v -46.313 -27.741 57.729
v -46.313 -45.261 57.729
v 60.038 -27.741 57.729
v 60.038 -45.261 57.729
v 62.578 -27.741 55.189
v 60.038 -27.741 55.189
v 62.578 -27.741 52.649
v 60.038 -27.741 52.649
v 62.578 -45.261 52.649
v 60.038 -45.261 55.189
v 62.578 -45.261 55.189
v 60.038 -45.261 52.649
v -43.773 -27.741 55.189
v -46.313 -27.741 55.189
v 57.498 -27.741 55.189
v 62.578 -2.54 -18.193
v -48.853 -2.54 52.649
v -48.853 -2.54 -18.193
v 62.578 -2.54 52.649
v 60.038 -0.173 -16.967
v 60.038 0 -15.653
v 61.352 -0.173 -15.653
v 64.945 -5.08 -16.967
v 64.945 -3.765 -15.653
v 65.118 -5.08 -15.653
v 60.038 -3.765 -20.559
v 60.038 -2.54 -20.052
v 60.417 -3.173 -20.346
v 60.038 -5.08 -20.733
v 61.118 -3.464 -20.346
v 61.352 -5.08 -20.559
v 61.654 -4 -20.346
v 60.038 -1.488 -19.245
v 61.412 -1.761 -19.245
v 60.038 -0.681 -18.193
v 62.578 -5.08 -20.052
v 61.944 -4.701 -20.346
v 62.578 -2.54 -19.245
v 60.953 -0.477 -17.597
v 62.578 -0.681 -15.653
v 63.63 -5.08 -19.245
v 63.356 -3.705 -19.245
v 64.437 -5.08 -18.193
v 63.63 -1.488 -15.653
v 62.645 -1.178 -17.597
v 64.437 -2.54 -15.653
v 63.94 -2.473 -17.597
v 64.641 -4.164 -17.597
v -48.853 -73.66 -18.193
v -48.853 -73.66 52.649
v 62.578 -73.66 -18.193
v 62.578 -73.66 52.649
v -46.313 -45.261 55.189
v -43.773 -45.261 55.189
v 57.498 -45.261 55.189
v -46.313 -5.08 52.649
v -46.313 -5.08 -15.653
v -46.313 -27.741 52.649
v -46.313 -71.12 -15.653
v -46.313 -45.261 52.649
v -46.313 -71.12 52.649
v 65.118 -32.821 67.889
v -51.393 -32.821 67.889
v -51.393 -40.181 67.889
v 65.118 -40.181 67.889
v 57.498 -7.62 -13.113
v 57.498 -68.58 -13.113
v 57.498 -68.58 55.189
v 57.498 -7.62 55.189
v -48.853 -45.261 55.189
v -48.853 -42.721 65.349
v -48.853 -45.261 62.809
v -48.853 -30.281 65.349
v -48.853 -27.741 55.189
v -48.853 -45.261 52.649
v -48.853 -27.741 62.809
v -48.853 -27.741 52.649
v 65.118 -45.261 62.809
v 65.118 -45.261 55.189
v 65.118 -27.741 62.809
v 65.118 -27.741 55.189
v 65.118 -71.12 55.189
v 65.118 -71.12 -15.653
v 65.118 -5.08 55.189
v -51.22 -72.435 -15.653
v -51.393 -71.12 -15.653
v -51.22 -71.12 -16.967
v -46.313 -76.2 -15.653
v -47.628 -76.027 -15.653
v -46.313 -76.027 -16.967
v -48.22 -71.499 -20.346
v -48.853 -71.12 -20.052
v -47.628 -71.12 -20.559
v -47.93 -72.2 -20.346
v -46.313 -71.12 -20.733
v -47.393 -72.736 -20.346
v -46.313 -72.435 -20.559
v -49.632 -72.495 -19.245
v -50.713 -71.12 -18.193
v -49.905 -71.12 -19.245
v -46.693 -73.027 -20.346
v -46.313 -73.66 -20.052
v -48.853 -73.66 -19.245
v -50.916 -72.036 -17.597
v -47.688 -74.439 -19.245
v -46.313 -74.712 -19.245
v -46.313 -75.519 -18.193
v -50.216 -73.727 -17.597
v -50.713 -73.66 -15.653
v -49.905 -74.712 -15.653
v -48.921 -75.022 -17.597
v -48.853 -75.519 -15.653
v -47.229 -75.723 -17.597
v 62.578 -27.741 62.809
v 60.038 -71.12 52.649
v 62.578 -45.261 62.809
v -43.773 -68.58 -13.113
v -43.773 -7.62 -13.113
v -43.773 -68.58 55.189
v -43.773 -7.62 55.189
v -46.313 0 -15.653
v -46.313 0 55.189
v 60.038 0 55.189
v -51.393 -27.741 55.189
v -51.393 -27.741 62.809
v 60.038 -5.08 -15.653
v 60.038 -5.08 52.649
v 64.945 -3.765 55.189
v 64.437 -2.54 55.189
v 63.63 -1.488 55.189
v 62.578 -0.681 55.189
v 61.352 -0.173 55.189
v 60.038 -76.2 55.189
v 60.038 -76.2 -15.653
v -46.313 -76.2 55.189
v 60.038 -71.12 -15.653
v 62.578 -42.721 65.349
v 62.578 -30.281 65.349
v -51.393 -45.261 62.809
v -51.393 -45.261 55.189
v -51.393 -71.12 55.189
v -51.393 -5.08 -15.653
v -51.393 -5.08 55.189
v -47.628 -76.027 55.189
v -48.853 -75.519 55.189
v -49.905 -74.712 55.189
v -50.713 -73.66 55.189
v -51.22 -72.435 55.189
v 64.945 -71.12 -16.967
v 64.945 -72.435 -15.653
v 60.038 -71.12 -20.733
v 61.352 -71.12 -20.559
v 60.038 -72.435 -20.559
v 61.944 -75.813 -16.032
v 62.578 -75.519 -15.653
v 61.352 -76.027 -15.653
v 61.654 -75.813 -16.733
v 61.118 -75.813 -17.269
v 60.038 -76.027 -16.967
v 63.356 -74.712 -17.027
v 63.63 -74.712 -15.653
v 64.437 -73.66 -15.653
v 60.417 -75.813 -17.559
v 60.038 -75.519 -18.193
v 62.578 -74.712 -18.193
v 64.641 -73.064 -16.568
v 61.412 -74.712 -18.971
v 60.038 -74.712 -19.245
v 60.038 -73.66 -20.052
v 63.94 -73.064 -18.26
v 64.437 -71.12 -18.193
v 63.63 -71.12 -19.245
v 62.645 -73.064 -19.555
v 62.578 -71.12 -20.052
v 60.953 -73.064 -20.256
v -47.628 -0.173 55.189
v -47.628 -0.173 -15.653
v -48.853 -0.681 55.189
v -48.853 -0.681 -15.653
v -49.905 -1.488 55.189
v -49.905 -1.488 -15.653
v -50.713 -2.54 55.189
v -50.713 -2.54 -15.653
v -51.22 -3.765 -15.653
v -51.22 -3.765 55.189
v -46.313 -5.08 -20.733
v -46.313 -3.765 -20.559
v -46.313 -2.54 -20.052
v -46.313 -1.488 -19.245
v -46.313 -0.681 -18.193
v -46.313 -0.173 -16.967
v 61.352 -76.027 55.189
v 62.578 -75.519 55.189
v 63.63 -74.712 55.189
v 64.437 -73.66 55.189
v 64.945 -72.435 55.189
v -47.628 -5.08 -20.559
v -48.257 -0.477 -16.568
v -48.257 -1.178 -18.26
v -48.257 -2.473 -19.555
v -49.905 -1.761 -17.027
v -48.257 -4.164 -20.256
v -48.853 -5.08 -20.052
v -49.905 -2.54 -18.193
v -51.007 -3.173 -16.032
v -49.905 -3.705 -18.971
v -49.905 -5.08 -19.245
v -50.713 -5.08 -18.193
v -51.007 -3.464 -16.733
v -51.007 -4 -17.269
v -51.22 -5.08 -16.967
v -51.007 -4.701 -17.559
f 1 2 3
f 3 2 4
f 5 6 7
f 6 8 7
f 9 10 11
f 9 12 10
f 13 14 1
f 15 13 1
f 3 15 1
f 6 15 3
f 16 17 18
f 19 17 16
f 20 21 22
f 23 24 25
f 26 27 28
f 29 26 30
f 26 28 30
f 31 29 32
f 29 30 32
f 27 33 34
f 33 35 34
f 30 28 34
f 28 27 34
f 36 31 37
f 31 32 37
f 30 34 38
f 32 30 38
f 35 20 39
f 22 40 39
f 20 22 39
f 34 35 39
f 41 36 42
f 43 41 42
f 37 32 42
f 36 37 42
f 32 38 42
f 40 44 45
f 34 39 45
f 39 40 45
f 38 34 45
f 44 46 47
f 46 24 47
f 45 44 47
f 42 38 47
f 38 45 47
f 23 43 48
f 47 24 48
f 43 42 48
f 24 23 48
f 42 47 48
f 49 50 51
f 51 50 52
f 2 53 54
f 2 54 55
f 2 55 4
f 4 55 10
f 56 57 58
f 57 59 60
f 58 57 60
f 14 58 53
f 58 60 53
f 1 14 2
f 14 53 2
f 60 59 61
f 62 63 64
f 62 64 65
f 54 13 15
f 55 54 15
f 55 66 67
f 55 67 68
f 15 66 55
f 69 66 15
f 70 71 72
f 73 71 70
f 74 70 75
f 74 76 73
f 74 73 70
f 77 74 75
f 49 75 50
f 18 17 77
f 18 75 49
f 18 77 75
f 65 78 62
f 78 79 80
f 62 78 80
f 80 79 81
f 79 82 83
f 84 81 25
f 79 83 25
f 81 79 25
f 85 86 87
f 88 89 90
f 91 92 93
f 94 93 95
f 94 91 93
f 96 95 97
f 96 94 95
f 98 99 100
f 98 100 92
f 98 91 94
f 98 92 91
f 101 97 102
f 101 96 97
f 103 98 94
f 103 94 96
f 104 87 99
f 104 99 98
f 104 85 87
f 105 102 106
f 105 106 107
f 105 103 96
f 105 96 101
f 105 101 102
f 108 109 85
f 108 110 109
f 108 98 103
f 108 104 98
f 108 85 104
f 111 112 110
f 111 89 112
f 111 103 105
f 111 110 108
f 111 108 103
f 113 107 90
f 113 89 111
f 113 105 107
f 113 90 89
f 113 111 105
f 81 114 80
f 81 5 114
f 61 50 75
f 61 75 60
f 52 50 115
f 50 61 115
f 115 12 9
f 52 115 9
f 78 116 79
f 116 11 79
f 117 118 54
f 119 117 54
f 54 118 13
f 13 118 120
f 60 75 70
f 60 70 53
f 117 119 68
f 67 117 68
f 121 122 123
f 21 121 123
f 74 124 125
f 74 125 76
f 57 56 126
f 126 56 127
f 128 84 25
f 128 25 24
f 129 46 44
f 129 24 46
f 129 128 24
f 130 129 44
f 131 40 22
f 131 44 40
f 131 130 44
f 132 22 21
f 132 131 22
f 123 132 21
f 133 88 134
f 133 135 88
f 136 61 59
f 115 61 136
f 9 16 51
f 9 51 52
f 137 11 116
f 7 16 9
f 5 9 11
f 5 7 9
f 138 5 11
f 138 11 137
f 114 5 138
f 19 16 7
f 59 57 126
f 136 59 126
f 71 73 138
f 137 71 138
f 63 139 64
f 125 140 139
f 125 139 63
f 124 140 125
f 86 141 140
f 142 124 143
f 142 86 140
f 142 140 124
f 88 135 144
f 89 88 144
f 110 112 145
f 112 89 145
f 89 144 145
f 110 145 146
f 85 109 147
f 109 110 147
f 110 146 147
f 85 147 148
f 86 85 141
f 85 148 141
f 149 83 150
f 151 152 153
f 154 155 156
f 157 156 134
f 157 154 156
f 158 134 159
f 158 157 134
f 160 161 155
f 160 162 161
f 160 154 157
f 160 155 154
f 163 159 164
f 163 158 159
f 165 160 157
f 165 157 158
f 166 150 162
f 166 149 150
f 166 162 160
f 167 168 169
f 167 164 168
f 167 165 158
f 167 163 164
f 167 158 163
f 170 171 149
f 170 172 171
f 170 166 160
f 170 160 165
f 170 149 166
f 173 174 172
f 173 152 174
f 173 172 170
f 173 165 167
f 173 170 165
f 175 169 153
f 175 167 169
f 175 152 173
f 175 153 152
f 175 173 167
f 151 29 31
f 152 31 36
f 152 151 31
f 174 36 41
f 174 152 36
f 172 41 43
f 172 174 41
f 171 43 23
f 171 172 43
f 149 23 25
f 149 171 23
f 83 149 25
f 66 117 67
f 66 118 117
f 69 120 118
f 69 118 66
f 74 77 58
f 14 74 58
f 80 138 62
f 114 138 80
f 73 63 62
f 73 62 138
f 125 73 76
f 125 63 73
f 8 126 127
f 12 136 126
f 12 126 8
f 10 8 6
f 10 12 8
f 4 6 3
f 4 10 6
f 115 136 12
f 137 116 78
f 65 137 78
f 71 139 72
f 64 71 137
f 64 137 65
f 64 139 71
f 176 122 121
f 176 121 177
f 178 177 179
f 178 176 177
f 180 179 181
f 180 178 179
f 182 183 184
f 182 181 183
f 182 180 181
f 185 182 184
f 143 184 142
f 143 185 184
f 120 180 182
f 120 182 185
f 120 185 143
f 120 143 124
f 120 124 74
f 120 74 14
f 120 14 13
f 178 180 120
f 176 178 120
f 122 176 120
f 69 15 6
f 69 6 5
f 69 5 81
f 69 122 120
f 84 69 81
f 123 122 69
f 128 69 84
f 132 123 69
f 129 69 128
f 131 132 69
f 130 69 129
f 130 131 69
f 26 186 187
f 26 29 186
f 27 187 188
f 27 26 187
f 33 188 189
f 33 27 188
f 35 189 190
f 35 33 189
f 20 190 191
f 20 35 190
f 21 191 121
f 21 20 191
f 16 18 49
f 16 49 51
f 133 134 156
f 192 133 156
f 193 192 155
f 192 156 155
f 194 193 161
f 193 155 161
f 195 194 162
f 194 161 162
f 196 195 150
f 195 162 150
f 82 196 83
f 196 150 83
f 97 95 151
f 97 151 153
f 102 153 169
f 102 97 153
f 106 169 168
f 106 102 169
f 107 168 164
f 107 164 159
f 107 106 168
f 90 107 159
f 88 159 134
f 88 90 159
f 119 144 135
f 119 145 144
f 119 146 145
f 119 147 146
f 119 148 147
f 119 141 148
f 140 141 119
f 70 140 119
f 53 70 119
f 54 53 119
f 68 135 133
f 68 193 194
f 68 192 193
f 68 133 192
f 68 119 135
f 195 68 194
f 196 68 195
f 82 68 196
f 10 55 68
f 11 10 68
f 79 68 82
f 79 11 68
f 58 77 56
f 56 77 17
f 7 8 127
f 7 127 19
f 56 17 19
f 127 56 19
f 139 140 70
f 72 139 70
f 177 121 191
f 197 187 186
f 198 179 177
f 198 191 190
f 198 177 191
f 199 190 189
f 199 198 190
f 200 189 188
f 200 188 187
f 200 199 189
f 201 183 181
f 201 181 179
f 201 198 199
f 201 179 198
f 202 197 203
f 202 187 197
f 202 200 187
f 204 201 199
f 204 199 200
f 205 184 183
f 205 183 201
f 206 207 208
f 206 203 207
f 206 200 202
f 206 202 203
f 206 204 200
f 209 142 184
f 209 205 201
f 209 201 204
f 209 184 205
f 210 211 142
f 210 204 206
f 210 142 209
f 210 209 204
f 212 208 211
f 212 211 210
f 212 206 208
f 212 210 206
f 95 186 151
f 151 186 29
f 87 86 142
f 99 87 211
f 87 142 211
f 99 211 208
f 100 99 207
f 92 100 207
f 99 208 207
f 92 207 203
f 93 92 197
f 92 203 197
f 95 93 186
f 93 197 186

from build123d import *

# Parameters (mm, degrees)
F0_W         = 116.5109202266
F0_H         = 75.9218987077
F1_DEPTH     = 76.2
F2_T         = -7.62
F3_W         = 116.5109202266
F3_H         = 17.5204388797
F4_DEPTH     = 12.7
F5_T         = -2.54
F6_R         = 5.08
F7_R         = 5.08
F8_R         = 5.08
F9_T1_DEPTH  = 66.04
F9_T3_DEPTH  = 106.3509202266
F9_T5_DEPTH  = 83.5418987077
F9_S9_W      = 5.08
F9_S9_H      = 5.08
F9_T10_DEPTH = 5.08
F9_T14_ANGLE = 90
F9_T16_ANGLE = 90
F10_T1_DEPTH = 142.6392193843
F11_T1_DEPTH = 142.6392193843


# Not quite as in the source:
# - a fillet or chamfer that OpenCascade refuses, or shapes differently, is made with other operations: its cross-section is extruded or revolved along the edge and cut away or added
# - a shell that OpenCascade refuses in one call is made with other operations: the cavity is built on its own and cut out


with BuildPart() as f1:
    # F0 (on Front) → F1 (new body)
    with BuildSketch(Plane.XZ):
        with Locations((6.8621747196, 17.2284292057)):
            Rectangle(F0_W, F0_H)
    extrude(amount=F1_DEPTH)

    # F2
    f2_openings = [f1.faces().sort_by_distance(p)[0] for p in [
        (6.862175, -38.1, 55.189379),
    ]]
    offset(amount=F2_T, openings=f2_openings)

    # F3 (on face) → F4 (join)
    with BuildSketch(Plane.XY.offset(55.1893785596)):
        with Locations((6.8621747196, -36.5009140223)):
            Rectangle(F3_W, F3_H)
    extrude(amount=F4_DEPTH)

    # F5: a shell. OpenCascade refuses it in one call, so the cavity is built on its own and cut out:
    # the body offset inwards by the wall thickness, plus a prism from it out through each open face.
    f5_core = offset(f1.part, amount=F5_T, kind=Kind.INTERSECTION, mode=Mode.PRIVATE)
    f5_exits = [f5_core.faces().sort_by_distance(p)[0] for p in [
        (6.862175, -42.721133, 61.352079),
        (6.862175, -30.280695, 61.352079),
    ]]
    add(f5_core, mode=Mode.SUBTRACT)
    extrude(f5_exits, amount=-F5_T, mode=Mode.SUBTRACT)

    # F6
    f6_edges = [f1.edges().sort_by_distance(p)[0] for p in [
        (65.117635, 0, 17.228429),
    ]]
    fillet(f6_edges, radius=F6_R)

    # F7
    f7_edges = [f1.edges().sort_by_distance(p)[0] for p in [
        (4.322175, 0, -20.73252),
        (-51.393285, 0, 17.228429),
    ]]
    fillet(f7_edges, radius=F7_R)

    # F8
    f8_edges = [f1.edges().sort_by_distance(p)[0] for p in [
        (-51.393285, -76.2, 17.228429),
    ]]
    fillet(f8_edges, radius=F8_R)

    # F9: fillet of radius 5.08 on 1 edges, made by hand

    # F9_s2 → F9_t1 (cut)
    with BuildSketch(Plane.XZ.offset(5.08)):
        with BuildLine():
            ThreePointArc((-51.3932853937, -15.6525201482), (-49.9053878421, -19.2446225966), (-46.3132853937, -20.7325201482))
            Line((-46.3132853937, -20.7325201482), (-51.3932853937, -20.7325201482))
            Line((-51.3932853937, -20.7325201482), (-51.3932853937, -15.6525201482))
        make_face()
    extrude(amount=F9_T1_DEPTH, mode=Mode.SUBTRACT)

    # F9_s4 → F9_t3 (cut)
    with BuildSketch(Plane.YZ.offset(-46.3132853937)):
        with BuildLine():
            ThreePointArc((-71.12, -20.7325201482), (-74.7121024484, -19.2446225966), (-76.2, -15.6525201482))
            Line((-76.2, -15.6525201482), (-76.2, -20.7325201482))
            Line((-76.2, -20.7325201482), (-71.12, -20.7325201482))
        make_face()
    extrude(amount=F9_T3_DEPTH, mode=Mode.SUBTRACT)

    # F9_s6 → F9_t5 (cut)
    with BuildSketch(Plane.XY.offset(-15.6525201482)):
        with BuildLine():
            ThreePointArc((60.0376348329, -76.2), (63.6297372813, -74.7121024484), (65.1176348329, -71.12))
            Line((65.1176348329, -71.12), (65.1176348329, -76.2))
            Line((65.1176348329, -76.2), (60.0376348329, -76.2))
        make_face()
    extrude(amount=F9_T5_DEPTH, mode=Mode.SUBTRACT)


with BuildPart() as f9_tool8:
    # F9_s9 → F9_t10 (new body)
    with BuildSketch(Plane.YZ.offset(-46.3132853937)):
        with Locations((-2.54, -18.1925201482)):
            Rectangle(F9_S9_W, F9_S9_H)
    extrude(amount=-F9_T10_DEPTH)

    # F9_s11 → F9_t12 (revolve, cut)
    with BuildSketch(Plane(origin=(-46.3132853937, -5.08, -15.6525201482), x_dir=(0, -0.7071067812, 0.7071067812), z_dir=(0, -0.7071067812, -0.7071067812))):
        with BuildLine():
            ThreePointArc((0, -5.08), (5.08, 0), (0, 5.08))
            Line((0, 5.08), (0, -5.08))
        make_face()
    revolve(axis=Axis((-46.3132853937, -5.08, -15.6525201482), (-1, 0, 0)), mode=Mode.SUBTRACT)


with BuildPart() as f1_1:
    add(f1.part)

    # F9_t7: cut F9_tool8
    add(f9_tool8.part, mode=Mode.SUBTRACT)

    # F9_s13 → F9_t14 (revolve, cut)
    with BuildSketch(Plane.XZ.offset(71.12)):
        with BuildLine():
            ThreePointArc((-46.3132853937, -20.7325201482), (-49.9053878421, -19.2446225966), (-51.3932853937, -15.6525201482))
            Line((-51.3932853937, -15.6525201482), (-51.3932853937, -20.7325201482))
            Line((-51.3932853937, -20.7325201482), (-46.3132853937, -20.7325201482))
        make_face()
    revolve(axis=Axis((-46.3132853937, -71.12, -20.7325201482), (0, 0, 1)), revolution_arc=F9_T14_ANGLE, mode=Mode.SUBTRACT)

    # F9_s15 → F9_t16 (revolve, cut)
    with BuildSketch(Plane.XY.offset(-15.6525201482)):
        with BuildLine():
            ThreePointArc((60.0376348329, -76.2), (63.6297372813, -74.7121024484), (65.1176348329, -71.12))
            Line((65.1176348329, -71.12), (65.1176348329, -76.2))
            Line((65.1176348329, -76.2), (60.0376348329, -76.2))
        make_face()
    revolve(axis=Axis((60.0376348329, -76.2, -15.6525201482), (0, 1, 0)), revolution_arc=F9_T16_ANGLE, mode=Mode.SUBTRACT)

    # F10: chamfer of 5.08 on 1 edges, made by hand

    # F10_s2 → F10_t1 (cut)
    with BuildSketch(Plane.YZ.offset(-64.4574349726)):
        Polygon((-45.2611334622, 62.8093785596), (-40.1811334622, 67.8893785596), (-45.2611334622, 67.8893785596), align=None)
    extrude(amount=F10_T1_DEPTH, mode=Mode.SUBTRACT)

    # F11: chamfer of 5.08 on 1 edges, made by hand

    # F11_s2 → F11_t1 (cut)
    with BuildSketch(Plane.YZ.offset(-64.4574349726)):
        Polygon((-32.8206945825, 67.8893785596), (-27.7406945825, 62.8093785596), (-27.7406945825, 67.8893785596), align=None)
    extrude(amount=F11_T1_DEPTH, mode=Mode.SUBTRACT)


solid = f1_1.part
